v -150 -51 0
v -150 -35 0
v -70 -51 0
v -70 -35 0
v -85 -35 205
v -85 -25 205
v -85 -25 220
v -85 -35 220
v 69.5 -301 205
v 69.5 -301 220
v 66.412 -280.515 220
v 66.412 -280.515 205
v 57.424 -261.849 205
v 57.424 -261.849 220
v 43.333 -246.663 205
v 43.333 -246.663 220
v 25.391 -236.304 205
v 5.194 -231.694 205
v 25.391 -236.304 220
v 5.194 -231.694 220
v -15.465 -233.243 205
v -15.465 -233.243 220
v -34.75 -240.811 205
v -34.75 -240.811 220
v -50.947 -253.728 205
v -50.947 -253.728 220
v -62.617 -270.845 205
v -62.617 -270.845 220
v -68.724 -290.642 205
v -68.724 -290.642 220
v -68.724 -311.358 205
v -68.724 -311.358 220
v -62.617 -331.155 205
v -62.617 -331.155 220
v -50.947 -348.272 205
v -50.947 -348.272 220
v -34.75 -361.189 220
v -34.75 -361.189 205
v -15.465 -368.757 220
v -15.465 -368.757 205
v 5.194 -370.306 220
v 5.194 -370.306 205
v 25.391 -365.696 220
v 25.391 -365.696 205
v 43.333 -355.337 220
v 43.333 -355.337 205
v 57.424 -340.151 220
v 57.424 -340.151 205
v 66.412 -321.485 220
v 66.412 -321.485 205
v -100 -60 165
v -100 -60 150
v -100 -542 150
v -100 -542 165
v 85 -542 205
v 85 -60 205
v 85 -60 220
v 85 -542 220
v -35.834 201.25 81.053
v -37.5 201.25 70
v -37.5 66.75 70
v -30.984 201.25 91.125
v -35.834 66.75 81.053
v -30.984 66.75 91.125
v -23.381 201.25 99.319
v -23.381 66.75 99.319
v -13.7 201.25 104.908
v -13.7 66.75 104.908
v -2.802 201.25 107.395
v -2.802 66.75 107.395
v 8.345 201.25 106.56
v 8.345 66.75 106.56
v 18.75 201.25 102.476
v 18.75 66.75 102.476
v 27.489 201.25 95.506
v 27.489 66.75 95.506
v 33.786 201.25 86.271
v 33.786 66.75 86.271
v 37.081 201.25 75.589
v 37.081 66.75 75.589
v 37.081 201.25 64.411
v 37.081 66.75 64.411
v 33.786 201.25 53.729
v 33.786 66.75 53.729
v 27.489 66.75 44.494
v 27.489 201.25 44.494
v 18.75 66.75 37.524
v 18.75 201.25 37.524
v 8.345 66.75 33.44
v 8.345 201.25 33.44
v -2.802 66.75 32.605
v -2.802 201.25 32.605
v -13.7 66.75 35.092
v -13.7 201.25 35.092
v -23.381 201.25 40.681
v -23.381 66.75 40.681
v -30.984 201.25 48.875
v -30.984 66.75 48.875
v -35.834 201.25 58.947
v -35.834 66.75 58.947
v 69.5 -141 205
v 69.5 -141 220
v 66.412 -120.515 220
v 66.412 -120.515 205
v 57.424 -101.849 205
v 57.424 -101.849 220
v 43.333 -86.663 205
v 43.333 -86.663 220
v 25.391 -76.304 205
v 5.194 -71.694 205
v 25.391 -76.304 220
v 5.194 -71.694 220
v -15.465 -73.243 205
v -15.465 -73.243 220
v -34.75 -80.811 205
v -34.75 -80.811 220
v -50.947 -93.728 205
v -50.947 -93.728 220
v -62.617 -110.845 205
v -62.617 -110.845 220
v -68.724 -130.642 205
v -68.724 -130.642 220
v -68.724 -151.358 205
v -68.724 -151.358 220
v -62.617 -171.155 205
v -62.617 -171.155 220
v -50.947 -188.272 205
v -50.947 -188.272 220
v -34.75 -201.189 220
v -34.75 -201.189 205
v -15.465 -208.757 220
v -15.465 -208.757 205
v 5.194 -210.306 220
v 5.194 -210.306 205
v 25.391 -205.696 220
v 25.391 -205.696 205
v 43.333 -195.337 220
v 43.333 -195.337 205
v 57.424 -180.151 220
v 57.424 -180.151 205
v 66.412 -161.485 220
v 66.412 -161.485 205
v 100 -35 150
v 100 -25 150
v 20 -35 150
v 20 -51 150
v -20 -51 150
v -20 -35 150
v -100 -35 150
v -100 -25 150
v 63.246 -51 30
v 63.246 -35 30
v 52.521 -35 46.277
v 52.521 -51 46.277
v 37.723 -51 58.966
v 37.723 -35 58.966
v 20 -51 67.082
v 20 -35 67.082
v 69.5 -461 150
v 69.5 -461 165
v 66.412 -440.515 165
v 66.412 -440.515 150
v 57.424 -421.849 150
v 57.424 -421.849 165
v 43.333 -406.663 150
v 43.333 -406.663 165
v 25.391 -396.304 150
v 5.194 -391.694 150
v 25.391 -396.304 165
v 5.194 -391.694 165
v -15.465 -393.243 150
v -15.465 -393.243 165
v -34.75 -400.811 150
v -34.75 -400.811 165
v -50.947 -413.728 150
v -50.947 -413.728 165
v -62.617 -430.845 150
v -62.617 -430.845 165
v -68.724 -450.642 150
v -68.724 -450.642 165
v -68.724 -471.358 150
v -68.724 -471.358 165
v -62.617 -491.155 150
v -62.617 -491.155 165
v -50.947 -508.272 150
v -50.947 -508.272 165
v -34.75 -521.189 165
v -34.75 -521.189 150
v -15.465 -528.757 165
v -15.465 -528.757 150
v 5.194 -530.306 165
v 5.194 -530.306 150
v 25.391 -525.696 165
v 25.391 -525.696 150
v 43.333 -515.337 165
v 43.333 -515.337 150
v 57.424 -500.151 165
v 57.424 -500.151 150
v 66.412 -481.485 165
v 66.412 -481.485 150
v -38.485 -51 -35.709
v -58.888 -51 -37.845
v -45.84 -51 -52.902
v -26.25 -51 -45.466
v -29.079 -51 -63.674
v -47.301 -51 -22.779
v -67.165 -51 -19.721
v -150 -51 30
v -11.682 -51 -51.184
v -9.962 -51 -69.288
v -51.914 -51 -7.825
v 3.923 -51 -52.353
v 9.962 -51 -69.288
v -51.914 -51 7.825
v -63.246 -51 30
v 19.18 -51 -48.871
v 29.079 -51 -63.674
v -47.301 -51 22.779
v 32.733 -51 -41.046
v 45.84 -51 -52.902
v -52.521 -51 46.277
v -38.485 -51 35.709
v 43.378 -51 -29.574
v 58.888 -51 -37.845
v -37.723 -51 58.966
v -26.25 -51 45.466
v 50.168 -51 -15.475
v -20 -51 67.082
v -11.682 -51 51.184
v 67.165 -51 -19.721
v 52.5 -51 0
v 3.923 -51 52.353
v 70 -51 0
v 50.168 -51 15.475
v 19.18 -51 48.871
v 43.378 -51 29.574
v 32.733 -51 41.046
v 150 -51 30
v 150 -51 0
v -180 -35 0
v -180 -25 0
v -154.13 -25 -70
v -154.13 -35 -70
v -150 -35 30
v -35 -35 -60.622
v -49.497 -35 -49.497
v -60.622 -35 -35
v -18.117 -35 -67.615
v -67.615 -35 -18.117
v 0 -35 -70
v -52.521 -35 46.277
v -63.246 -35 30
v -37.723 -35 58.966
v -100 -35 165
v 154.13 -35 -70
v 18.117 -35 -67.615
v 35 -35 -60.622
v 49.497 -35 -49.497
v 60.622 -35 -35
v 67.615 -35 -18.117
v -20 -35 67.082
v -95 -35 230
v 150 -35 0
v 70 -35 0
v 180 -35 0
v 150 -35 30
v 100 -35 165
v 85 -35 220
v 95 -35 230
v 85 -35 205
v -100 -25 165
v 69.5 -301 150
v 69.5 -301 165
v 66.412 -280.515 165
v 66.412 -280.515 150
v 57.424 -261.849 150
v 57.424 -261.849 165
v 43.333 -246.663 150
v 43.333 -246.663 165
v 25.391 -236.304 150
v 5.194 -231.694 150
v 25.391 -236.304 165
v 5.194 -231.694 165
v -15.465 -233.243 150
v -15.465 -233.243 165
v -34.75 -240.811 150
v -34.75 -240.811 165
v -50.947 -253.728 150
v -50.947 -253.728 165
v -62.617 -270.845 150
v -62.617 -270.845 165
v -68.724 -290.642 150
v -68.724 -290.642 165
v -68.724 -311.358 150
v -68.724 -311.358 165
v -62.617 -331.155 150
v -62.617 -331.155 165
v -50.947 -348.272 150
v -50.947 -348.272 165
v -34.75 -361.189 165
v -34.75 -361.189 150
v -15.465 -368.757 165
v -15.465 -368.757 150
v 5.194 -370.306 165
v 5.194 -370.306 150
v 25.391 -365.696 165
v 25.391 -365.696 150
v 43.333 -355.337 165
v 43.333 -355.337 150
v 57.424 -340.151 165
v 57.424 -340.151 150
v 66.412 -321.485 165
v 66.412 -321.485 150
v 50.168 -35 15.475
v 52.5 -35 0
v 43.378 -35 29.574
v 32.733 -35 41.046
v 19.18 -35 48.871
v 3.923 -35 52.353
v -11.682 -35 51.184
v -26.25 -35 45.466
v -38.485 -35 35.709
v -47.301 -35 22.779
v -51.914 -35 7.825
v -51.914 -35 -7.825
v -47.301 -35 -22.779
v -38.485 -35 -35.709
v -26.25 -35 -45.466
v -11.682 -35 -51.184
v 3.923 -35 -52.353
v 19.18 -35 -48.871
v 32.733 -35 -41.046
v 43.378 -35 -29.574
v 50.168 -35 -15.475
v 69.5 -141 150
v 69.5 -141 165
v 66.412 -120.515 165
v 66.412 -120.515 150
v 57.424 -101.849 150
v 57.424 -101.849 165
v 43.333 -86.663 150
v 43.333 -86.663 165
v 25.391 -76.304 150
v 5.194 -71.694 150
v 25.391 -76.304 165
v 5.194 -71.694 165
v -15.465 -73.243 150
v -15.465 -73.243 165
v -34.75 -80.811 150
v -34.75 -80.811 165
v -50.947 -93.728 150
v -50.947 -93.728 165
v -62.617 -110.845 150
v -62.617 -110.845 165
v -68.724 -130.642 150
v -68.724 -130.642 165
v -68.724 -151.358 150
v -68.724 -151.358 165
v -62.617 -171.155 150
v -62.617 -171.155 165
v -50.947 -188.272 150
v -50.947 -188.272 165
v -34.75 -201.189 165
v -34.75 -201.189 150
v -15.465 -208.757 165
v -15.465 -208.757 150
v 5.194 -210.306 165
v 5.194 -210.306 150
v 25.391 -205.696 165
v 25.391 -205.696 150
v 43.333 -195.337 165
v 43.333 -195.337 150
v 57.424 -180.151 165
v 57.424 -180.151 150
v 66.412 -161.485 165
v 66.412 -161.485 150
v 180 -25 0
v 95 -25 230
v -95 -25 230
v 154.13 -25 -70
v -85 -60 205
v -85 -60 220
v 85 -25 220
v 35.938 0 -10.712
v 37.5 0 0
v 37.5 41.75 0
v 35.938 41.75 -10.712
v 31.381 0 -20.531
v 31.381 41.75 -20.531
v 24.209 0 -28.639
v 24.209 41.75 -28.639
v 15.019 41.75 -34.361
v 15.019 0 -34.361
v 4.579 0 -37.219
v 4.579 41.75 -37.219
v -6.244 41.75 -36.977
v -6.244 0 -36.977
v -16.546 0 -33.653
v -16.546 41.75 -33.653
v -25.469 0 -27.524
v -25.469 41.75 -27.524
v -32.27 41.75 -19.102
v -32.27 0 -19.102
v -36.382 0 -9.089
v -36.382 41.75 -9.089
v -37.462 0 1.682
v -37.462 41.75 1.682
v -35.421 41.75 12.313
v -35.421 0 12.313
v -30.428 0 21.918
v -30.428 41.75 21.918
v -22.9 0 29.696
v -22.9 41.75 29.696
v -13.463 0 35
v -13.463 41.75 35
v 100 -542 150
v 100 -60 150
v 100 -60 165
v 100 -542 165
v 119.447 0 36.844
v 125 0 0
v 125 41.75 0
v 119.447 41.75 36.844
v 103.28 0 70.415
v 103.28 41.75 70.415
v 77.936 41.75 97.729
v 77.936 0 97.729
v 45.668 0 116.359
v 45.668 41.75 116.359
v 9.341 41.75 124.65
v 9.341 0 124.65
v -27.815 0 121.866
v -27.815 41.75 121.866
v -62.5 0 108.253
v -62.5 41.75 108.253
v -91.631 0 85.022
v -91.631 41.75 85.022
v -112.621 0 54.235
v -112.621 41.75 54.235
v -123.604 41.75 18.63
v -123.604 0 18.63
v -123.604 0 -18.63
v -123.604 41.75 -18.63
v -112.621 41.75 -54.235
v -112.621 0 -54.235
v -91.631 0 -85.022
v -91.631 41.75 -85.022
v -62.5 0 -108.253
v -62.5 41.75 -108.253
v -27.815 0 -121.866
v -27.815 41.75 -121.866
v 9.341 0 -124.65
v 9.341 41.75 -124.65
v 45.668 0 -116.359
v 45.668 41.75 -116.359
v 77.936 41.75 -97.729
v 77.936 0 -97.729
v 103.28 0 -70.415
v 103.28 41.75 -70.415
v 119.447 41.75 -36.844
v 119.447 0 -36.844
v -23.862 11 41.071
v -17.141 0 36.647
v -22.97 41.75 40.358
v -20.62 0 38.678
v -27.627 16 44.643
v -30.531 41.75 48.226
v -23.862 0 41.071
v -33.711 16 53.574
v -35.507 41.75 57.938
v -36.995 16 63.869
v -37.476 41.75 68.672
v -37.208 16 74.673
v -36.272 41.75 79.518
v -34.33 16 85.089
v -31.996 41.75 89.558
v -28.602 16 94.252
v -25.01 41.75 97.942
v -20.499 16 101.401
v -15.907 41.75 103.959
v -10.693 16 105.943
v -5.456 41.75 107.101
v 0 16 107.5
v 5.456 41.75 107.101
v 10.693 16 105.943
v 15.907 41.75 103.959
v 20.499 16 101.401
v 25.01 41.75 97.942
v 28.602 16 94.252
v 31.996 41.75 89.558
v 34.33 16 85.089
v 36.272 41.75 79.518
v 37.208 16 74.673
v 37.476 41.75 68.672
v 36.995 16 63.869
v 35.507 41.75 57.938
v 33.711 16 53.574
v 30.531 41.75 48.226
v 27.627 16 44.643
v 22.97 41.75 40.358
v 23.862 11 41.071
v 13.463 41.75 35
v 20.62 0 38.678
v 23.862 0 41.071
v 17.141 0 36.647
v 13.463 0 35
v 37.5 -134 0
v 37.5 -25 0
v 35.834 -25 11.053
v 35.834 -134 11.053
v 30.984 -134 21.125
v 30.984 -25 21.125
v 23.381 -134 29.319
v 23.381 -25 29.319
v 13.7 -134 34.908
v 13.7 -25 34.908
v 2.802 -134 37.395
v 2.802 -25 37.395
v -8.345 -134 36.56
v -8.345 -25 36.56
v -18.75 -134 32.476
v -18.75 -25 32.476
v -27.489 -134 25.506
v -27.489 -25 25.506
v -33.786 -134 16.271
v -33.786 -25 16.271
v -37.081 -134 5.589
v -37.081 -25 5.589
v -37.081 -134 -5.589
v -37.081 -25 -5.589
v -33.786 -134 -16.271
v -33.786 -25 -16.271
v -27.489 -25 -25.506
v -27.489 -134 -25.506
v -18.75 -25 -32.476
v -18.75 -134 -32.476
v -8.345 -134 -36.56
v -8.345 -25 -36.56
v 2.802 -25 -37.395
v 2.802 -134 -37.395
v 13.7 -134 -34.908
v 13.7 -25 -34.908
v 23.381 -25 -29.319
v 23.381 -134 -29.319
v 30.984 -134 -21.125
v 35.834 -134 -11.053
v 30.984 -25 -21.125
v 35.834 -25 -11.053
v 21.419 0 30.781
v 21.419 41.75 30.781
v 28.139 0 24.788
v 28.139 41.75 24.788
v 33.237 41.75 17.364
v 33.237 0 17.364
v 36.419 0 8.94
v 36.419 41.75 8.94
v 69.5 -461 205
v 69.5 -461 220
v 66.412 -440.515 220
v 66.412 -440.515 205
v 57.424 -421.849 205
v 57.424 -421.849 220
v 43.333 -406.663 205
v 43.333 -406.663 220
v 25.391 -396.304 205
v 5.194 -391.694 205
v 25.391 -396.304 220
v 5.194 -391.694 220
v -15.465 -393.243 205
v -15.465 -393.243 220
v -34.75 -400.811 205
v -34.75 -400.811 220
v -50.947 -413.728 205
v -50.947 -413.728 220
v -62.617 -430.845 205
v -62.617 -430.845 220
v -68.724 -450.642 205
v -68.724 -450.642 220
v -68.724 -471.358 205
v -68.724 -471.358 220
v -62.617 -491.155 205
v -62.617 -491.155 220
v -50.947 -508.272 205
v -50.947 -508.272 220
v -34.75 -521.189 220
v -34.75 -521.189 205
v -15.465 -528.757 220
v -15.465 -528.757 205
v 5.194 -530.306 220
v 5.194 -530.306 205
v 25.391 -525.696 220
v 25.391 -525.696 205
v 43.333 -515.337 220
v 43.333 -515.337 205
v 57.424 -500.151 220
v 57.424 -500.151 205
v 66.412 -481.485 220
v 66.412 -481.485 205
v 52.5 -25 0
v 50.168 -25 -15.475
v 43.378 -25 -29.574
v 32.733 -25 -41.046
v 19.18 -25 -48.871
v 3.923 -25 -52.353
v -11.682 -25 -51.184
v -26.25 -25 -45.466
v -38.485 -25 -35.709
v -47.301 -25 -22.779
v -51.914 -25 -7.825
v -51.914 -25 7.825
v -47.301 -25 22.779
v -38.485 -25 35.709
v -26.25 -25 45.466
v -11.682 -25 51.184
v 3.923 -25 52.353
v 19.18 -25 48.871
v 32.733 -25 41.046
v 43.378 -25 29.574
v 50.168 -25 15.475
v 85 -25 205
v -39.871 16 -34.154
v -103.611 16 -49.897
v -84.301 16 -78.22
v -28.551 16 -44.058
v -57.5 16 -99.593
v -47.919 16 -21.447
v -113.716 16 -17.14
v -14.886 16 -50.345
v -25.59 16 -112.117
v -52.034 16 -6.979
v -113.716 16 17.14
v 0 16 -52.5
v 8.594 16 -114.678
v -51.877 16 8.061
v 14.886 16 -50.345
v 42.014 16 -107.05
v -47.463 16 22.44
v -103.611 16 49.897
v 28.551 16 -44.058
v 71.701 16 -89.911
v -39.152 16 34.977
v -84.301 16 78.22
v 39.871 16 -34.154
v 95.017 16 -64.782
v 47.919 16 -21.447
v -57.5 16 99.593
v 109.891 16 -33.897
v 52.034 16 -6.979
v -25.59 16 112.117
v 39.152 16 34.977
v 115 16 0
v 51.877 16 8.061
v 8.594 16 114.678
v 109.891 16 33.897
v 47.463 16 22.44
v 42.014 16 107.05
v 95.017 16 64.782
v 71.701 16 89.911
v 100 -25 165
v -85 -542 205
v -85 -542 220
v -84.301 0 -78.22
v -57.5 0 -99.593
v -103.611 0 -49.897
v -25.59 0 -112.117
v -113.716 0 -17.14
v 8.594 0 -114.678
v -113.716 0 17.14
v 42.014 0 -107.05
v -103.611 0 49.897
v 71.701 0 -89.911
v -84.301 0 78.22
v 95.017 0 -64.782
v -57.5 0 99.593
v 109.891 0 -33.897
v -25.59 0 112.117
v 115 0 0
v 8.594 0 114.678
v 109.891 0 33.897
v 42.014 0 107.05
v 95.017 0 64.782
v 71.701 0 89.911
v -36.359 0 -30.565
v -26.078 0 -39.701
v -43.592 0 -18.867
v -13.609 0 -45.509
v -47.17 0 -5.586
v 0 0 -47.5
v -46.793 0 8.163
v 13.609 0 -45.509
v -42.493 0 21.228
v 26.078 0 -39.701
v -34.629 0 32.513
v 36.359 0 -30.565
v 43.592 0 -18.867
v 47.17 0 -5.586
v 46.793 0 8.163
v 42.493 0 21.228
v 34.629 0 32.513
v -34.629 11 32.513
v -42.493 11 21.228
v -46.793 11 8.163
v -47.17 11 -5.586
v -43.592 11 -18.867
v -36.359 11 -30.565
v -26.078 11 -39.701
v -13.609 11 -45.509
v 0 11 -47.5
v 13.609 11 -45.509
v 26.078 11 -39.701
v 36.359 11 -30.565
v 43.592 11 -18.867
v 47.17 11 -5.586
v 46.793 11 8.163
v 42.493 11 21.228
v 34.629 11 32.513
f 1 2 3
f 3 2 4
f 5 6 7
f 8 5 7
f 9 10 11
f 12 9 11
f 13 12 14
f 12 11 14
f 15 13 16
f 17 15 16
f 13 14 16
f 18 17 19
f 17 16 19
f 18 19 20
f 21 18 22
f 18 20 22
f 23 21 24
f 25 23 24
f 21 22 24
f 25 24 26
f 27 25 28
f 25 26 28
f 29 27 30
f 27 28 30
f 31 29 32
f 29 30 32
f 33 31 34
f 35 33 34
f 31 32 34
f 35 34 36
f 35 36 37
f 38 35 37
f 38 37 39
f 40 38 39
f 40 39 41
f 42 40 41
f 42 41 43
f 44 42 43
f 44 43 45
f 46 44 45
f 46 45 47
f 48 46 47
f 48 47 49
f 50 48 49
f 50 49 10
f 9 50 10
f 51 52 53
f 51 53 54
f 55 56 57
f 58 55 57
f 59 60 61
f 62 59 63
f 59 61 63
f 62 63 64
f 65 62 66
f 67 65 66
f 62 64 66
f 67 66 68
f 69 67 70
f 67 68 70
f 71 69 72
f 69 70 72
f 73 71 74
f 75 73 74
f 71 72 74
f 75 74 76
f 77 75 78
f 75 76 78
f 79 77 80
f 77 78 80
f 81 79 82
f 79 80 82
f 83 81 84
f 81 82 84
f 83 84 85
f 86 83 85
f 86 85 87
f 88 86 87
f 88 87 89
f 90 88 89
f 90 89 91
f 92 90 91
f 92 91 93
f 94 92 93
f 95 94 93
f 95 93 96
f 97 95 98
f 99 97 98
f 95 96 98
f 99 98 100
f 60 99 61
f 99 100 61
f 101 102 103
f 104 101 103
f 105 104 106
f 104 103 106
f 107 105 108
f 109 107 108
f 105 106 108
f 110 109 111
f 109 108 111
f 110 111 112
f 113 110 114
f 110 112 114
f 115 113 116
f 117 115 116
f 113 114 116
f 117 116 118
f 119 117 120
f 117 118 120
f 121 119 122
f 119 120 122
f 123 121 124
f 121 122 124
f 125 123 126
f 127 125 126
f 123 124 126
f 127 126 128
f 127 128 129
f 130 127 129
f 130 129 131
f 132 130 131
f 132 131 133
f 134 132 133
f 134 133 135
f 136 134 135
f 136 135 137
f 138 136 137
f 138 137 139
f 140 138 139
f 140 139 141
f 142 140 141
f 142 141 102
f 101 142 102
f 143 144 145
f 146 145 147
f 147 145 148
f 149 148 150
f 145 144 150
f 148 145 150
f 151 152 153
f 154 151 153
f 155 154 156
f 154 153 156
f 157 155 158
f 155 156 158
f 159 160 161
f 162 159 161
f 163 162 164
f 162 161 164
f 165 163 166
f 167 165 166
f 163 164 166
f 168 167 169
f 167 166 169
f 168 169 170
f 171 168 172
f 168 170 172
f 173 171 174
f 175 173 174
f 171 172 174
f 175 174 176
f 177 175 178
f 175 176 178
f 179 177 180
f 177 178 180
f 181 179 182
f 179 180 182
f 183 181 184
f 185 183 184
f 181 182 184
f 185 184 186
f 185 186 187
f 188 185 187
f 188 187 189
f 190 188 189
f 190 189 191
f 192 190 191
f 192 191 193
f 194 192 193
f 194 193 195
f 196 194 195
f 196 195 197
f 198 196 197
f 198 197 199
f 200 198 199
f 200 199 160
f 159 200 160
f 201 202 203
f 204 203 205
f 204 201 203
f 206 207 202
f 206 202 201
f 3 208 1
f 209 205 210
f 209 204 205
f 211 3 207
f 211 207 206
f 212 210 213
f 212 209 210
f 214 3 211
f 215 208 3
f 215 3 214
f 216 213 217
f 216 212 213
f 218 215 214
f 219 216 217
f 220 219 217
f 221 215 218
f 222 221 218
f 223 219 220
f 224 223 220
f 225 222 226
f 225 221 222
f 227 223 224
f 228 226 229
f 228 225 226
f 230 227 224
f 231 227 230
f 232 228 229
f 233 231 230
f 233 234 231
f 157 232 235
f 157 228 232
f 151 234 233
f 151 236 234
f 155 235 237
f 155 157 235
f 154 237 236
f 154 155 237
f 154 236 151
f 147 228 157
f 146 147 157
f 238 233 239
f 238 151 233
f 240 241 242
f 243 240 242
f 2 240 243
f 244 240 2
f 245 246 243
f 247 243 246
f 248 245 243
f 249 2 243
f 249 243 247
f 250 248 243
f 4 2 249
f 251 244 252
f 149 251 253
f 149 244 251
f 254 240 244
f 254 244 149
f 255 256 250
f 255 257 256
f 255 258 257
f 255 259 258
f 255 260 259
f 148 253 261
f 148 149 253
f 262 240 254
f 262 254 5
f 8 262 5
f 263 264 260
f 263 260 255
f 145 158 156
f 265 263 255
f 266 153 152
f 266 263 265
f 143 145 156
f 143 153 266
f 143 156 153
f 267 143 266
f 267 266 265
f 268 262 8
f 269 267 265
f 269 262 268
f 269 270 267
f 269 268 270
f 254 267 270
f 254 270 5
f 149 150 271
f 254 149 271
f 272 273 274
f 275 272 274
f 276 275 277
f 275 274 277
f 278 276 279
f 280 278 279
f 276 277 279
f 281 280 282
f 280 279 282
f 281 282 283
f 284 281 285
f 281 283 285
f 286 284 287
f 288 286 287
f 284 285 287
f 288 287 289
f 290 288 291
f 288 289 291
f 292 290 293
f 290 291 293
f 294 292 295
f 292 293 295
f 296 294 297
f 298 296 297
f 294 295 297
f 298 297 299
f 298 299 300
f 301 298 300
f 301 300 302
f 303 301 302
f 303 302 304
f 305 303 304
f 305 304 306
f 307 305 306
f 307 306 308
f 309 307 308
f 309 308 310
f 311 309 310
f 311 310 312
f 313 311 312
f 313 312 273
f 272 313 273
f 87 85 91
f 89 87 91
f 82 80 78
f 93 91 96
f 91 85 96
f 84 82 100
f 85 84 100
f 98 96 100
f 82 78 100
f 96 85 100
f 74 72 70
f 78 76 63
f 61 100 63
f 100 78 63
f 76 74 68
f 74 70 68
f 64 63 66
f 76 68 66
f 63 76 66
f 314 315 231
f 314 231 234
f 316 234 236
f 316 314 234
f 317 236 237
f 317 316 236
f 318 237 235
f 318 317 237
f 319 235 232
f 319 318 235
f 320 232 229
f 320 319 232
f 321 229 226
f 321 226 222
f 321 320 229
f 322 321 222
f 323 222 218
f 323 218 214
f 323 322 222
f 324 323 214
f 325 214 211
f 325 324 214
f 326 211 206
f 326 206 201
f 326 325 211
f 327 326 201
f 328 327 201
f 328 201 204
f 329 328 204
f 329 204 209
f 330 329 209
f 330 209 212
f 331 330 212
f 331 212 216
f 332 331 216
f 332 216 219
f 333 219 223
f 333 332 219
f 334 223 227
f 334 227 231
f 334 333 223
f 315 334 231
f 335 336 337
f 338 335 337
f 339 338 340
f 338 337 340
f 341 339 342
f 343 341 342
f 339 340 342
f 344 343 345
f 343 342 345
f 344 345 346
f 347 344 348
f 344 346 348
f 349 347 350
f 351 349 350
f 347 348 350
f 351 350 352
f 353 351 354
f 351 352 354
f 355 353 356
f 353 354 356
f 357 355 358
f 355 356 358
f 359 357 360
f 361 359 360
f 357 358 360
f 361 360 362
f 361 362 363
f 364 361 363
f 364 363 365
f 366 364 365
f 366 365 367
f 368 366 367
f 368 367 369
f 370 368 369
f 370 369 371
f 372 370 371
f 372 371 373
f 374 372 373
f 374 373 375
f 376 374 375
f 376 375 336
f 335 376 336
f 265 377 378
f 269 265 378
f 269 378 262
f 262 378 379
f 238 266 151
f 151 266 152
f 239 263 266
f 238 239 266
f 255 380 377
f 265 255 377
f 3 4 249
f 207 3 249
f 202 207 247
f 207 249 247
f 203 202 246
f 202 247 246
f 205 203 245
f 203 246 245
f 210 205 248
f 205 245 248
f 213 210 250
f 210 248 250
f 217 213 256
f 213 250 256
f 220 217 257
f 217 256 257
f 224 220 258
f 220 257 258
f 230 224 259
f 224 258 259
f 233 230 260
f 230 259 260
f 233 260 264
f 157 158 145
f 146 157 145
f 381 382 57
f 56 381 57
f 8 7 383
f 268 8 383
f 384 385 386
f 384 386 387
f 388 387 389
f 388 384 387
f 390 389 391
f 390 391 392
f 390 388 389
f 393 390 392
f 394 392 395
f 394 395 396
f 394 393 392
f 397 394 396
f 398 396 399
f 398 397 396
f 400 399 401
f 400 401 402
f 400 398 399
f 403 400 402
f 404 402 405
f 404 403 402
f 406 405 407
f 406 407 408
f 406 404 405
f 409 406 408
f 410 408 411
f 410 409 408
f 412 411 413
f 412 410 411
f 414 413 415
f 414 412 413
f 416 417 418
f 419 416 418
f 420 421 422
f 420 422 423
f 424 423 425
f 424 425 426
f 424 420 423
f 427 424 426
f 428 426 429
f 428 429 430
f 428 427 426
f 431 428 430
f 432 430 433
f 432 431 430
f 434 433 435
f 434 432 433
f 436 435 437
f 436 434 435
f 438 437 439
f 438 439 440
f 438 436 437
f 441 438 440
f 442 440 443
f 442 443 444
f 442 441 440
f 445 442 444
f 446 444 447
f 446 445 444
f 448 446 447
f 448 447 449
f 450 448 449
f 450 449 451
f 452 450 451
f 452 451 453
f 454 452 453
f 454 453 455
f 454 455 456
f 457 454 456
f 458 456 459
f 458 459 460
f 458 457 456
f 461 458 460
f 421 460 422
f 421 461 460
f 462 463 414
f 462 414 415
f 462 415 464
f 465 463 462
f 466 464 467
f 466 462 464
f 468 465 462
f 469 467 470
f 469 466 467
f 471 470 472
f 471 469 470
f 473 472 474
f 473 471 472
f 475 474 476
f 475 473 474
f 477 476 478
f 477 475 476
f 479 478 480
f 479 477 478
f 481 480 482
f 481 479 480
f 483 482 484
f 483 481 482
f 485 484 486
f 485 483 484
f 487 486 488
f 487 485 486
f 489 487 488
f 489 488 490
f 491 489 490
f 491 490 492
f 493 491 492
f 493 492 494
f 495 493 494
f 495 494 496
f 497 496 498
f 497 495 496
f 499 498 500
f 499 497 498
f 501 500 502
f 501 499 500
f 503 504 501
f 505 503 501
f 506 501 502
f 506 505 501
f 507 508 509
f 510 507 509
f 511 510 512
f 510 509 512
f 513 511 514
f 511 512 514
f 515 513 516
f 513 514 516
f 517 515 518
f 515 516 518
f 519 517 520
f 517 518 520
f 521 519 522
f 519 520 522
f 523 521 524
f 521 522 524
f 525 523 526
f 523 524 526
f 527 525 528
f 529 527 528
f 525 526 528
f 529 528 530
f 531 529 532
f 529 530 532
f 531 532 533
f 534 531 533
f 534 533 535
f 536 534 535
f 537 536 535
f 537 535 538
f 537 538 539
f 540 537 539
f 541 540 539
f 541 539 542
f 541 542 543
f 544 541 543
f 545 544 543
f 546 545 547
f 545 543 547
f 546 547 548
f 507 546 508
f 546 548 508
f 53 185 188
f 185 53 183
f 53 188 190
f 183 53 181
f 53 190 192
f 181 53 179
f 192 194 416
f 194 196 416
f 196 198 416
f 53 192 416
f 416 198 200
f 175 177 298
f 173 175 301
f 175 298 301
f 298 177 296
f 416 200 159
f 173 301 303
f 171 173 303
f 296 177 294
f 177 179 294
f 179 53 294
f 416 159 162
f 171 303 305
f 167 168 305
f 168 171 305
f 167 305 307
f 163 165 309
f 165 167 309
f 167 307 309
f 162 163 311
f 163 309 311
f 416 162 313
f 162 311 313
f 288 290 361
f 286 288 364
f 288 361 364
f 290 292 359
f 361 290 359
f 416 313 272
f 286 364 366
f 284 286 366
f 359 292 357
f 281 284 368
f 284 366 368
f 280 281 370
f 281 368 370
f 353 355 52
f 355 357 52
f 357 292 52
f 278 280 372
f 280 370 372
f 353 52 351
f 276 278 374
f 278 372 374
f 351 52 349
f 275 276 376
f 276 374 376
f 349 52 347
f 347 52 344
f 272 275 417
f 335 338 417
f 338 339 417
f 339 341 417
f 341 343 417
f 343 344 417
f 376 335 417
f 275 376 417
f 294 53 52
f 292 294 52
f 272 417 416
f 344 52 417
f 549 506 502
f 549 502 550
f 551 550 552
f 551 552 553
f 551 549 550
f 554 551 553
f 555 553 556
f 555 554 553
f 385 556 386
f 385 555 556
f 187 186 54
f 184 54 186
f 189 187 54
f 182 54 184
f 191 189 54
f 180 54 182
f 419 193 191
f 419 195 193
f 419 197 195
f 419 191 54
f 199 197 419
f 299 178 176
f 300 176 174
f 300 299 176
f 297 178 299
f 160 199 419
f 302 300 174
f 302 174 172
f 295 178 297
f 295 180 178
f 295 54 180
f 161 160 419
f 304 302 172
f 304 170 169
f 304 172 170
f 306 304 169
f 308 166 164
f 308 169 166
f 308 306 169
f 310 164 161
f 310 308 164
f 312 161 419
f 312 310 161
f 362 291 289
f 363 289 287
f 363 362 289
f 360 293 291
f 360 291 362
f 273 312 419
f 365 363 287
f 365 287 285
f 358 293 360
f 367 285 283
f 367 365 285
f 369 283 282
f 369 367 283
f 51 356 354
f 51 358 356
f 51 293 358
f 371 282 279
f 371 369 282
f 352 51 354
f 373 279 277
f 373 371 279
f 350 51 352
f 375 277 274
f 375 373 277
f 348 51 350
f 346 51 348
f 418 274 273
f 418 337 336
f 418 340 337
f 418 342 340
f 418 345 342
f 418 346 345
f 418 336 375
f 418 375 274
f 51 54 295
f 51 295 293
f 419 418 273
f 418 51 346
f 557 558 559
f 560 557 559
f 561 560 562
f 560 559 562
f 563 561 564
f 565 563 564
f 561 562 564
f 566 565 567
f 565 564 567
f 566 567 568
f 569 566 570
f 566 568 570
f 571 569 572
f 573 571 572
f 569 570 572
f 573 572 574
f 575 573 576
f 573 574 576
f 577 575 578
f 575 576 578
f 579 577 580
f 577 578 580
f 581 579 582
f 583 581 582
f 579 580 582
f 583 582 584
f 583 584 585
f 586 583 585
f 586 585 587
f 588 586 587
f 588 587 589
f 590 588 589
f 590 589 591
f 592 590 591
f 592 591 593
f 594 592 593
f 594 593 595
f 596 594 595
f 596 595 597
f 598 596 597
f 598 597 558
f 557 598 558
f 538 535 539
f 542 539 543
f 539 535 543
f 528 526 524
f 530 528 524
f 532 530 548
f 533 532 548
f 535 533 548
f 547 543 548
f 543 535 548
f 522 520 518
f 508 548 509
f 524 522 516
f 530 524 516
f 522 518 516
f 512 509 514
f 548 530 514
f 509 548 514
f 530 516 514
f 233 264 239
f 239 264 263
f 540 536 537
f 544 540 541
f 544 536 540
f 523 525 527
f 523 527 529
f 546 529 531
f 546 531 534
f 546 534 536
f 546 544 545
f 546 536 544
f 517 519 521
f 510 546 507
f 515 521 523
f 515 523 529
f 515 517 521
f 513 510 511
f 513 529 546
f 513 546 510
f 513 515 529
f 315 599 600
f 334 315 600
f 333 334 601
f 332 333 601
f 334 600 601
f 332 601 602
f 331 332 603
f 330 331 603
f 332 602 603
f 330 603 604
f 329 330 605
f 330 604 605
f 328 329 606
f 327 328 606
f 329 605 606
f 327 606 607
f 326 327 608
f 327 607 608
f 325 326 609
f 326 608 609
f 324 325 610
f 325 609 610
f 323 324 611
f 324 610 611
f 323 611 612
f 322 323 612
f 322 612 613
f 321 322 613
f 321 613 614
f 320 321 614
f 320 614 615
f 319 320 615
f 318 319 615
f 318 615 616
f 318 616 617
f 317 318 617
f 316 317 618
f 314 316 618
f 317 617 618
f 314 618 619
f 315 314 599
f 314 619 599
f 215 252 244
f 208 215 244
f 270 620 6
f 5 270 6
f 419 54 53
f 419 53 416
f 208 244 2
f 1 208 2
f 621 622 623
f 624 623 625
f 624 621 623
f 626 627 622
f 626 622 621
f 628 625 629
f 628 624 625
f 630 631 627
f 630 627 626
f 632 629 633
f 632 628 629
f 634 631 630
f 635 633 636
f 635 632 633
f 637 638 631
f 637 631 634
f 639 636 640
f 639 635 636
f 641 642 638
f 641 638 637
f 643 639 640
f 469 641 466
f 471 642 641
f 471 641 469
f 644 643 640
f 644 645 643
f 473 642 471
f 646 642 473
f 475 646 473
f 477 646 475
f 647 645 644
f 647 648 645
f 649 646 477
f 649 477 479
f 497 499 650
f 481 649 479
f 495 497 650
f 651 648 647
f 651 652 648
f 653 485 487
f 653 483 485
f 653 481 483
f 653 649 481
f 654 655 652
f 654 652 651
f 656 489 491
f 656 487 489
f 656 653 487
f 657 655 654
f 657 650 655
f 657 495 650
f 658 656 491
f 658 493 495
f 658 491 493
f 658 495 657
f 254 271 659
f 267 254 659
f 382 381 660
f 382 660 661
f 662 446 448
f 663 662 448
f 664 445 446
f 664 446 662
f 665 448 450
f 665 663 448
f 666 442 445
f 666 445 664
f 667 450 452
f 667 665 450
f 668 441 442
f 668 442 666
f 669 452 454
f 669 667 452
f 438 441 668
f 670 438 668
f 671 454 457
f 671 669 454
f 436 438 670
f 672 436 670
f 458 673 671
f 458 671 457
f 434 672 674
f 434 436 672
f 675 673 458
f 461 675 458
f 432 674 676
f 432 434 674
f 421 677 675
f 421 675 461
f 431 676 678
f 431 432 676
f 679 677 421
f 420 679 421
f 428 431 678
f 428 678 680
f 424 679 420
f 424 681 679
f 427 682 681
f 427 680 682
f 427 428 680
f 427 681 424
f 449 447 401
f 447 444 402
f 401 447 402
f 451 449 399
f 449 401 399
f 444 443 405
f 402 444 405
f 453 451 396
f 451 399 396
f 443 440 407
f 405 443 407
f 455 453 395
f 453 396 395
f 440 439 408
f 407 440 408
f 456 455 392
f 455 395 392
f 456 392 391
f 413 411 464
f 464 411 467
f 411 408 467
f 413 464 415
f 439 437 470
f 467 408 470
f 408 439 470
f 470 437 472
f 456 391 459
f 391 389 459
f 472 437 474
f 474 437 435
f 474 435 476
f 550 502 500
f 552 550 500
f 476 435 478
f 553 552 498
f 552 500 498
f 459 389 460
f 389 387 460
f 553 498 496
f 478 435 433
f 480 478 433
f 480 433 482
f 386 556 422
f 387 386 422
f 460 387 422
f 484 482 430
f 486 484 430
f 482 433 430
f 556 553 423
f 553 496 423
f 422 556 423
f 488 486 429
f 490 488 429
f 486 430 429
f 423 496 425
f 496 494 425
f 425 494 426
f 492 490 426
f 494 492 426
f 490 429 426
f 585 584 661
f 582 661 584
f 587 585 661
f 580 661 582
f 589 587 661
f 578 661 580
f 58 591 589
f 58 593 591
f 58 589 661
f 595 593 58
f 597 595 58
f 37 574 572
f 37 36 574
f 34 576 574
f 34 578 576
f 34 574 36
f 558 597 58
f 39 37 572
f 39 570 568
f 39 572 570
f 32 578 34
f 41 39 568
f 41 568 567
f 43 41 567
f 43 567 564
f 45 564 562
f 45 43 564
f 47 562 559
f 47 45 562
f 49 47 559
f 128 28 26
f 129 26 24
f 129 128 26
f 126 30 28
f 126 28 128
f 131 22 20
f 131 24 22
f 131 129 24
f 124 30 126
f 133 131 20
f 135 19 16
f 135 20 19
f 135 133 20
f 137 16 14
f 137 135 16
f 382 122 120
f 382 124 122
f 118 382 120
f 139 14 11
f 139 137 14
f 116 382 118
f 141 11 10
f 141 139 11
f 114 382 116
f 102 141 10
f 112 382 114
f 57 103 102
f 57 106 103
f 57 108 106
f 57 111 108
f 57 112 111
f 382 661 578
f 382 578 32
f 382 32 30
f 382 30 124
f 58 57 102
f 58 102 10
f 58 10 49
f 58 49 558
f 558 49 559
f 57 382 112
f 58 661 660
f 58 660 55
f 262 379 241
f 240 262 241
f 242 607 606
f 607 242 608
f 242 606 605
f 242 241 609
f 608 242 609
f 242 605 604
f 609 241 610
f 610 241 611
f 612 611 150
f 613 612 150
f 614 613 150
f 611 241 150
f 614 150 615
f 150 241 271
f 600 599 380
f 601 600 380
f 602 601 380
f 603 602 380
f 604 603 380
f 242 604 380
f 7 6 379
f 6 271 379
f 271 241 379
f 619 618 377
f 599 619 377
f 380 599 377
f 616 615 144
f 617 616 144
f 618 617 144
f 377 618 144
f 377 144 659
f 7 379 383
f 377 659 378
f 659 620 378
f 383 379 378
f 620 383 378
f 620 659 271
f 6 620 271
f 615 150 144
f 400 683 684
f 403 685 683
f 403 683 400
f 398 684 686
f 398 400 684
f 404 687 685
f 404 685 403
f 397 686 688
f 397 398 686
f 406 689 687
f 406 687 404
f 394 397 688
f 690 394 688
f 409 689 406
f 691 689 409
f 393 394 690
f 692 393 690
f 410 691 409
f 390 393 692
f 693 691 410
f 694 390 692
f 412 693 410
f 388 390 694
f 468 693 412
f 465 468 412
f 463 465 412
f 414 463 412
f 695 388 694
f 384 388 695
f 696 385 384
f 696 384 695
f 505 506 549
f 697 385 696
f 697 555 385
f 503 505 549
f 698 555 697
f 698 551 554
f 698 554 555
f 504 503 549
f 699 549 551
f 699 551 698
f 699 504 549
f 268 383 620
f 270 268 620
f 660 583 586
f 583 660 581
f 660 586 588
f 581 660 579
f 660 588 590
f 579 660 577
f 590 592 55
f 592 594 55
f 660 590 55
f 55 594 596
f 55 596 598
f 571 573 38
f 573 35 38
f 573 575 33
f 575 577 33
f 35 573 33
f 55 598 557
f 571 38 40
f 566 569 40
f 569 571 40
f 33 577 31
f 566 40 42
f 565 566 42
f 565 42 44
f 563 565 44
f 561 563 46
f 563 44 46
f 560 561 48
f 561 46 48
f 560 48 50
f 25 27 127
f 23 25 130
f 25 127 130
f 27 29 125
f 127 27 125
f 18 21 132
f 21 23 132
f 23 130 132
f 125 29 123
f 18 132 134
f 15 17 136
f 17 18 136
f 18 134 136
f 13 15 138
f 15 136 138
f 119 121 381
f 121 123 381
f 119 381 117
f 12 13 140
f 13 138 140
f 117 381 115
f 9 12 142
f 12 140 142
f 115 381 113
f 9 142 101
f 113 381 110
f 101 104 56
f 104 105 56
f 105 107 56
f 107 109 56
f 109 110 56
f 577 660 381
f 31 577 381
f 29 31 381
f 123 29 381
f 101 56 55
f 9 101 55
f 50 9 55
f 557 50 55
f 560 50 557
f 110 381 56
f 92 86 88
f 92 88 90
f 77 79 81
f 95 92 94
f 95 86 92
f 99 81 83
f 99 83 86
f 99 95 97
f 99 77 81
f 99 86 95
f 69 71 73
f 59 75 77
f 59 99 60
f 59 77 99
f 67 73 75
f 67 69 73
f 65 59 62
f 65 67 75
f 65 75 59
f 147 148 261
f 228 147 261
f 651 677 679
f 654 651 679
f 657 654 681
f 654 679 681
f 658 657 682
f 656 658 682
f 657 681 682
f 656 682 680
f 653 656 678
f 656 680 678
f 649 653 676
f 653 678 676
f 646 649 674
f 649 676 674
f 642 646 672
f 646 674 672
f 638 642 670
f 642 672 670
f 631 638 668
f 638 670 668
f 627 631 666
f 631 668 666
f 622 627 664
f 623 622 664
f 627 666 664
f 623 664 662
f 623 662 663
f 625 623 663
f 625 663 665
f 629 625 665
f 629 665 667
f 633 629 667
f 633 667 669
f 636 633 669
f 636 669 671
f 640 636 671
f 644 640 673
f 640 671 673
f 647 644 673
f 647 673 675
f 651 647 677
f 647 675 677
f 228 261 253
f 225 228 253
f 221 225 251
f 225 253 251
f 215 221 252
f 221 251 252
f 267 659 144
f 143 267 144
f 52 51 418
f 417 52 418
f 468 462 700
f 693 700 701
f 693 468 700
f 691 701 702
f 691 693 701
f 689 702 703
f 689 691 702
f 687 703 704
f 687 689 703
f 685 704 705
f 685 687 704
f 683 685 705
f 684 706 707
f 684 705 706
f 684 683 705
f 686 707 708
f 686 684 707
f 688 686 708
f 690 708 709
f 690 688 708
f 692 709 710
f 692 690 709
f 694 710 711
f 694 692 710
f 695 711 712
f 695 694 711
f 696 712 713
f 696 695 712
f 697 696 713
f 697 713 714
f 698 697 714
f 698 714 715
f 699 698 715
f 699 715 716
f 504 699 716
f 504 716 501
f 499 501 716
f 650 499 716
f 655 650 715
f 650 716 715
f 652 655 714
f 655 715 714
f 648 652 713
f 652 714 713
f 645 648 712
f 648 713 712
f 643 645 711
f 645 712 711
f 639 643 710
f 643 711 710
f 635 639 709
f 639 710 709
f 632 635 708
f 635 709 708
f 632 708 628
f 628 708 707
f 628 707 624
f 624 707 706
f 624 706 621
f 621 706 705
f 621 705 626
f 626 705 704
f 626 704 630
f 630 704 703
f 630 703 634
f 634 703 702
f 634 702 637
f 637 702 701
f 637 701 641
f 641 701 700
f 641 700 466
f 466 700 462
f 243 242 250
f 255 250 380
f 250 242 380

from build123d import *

# Parameters (mm, degrees)
F0_R      = 125
F1_DEPTH  = 41.75
F3_R      = 37.5
F4_DEPTH  = 109
F6_R      = 37.5
F7_DEPTH  = 134.5
F9_DEPTH  = 10
F10_R     = 52.5
F11_DEPTH = 16
F13_W     = 170
F13_H     = 15
F14_DEPTH = 482
F13_W_2   = 200
F15_R     = 69.5
F16_DEPTH = 100
F17_R     = 115
F17_R_2   = 47.5
F18_DEPTH = 16
F19_SIZE  = 5


with BuildPart() as f1:
    # F0 (on Front) → F1 (new body)
    with BuildSketch(Plane.XZ):
        Circle(F0_R)
        with BuildLine():
            ThreePointArc((36.1296990006, 59.9553571429), (60.9470217896, 34.4305174951), (70, 0))
            ThreePointArc((70, 0), (-34.4305174951, -60.9470217896), (-36.1296990006, 59.9553571429))
            ThreePointArc((-36.1296990006, 59.9553571429), (-5.0688404728, 107.1558455194), (37.5, 70))
            ThreePointArc((37.5, 70), (37.1558455194, 64.9311595272), (36.1296990006, 59.9553571429))
        make_face(mode=Mode.SUBTRACT)
        with BuildLine():
            ThreePointArc((-36.1296990006, 59.9553571429), (-34.4305174951, -60.9470217896), (70, 0))
            ThreePointArc((70, 0), (60.9470217896, 34.4305174951), (36.1296990006, 59.9553571429))
            ThreePointArc((36.1296990006, 59.9553571429), (27.7587685144, 44.7868928816), (13.4629120178, 35))
            ThreePointArc((13.4629120178, 35), (30.912046201, 21.2295878355), (37.5, 0))
            ThreePointArc((37.5, 0), (-21.2295878355, -30.912046201), (-13.4629120178, 35))
            ThreePointArc((-13.4629120178, 35), (-27.7587685144, 44.7868928816), (-36.1296990006, 59.9553571429))
        make_face()
    extrude(amount=-F1_DEPTH)

    # F17 (on face) → F18 (cut)
    with BuildSketch(Plane.XZ):
        Circle(F17_R)
        with BuildLine():
            ThreePointArc((37.5, 70), (37.1558455194, 64.9311595272), (36.1296990006, 59.9553571429))
            ThreePointArc((36.1296990006, 59.9553571429), (60.9470217896, 34.4305174951), (70, 0))
            ThreePointArc((70, 0), (-34.4305174951, -60.9470217896), (-36.1296990006, 59.9553571429))
            ThreePointArc((-36.1296990006, 59.9553571429), (-5.0688404728, 107.1558455194), (37.5, 70))
        make_face(mode=Mode.SUBTRACT)
        with BuildLine():
            ThreePointArc((70, 0), (60.9470217896, 34.4305174951), (36.1296990006, 59.9553571429))
            ThreePointArc((36.1296990006, 59.9553571429), (37.1558455194, 64.9311595272), (37.5, 70))
            ThreePointArc((37.5, 70), (-5.0688404728, 107.1558455194), (-36.1296990006, 59.9553571429))
            ThreePointArc((-36.1296990006, 59.9553571429), (-34.4305174951, -60.9470217896), (70, 0))
        make_face()
        Circle(F17_R_2, mode=Mode.SUBTRACT)
    extrude(amount=-F18_DEPTH, mode=Mode.SUBTRACT)

    # F19
    f19_edges = [f1.edges().sort_by_distance(p)[0] for p in [
        (0, 16, -47.5),
    ]]
    chamfer(f19_edges, length=F19_SIZE)


with BuildPart() as f4:
    # F3 (on offset) → F4 (new body)
    with BuildSketch(Plane.XZ.offset(25)):
        Circle(F3_R)
    extrude(amount=F4_DEPTH)


with BuildPart() as f7:
    # F6 (on offset) → F7 (new body)
    with BuildSketch(Plane(origin=(0, 66.75, 0), x_dir=(-1, 0, 0), z_dir=(0, 1, 0))):
        with Locations((0, 70)):
            Circle(F6_R)
    extrude(amount=F7_DEPTH)


with BuildPart() as f9:
    # F8 (on offset) → F9 (new body)
    with BuildSketch(Plane.XZ.offset(25)):
        with BuildLine():
            ThreePointArc((0, -52.5), (-37.1231060123, 37.1231060123), (52.5, 0))
            Line((52.5, 0), (180, 0))
            Line((180, 0), (95, 230))
            Line((95, 230), (0, 230))
            Line((0, 230), (-95, 230))
            Line((-95, 230), (-180, 0))
            Line((-180, 0), (-154.1304347826, -70))
            Line((-154.1304347826, -70), (0, -70))
            Line((0, -70), (0, -52.5))
        make_face()
        Polygon((-100, 165), (0, 165), (100, 165), (100, 150), (0, 150), (-100, 150), align=None, mode=Mode.SUBTRACT)
        Polygon((-85, 220), (0, 220), (85, 220), (85, 205), (0, 205), (-85, 205), align=None, mode=Mode.SUBTRACT)
        with BuildLine():
            Line((180, 0), (52.5, 0))
            ThreePointArc((52.5, 0), (37.1231060123, -37.1231060123), (0, -52.5))
            Line((0, -52.5), (0, -70))
            Line((0, -70), (154.1304347826, -70))
            Line((154.1304347826, -70), (180, 0))
        make_face()
    extrude(amount=F9_DEPTH)

    # F10 (on face) → F11 (join)
    with BuildSketch(Plane.XZ.offset(35)):
        with BuildLine():
            ThreePointArc((-20, 67.082039325), (-10.1058707505, 69.2666685815), (0, 70))
            Line((0, 70), (0, 150))
            Line((0, 150), (-20, 150))
            Line((-20, 150), (-20, 67.082039325))
        make_face()
        with BuildLine():
            ThreePointArc((0, 70), (10.1058707505, 69.2666685815), (20, 67.082039325))
            Line((20, 67.082039325), (20, 150))
            Line((20, 150), (0, 150))
            Line((0, 150), (0, 70))
        make_face()
        with BuildLine():
            ThreePointArc((1.627e-07, -70), (49.4974747406, -49.4974746255), (70, 0))
            ThreePointArc((70, 0), (68.2905144373, 15.3754882161), (63.2455532034, 30))
            ThreePointArc((63.2455532034, 30), (45.5656113989, 53.1392045277), (20, 67.082039325))
            ThreePointArc((20, 67.082039325), (10.1058707505, 69.2666685815), (0, 70))
            ThreePointArc((0, 70), (-10.1058707505, 69.2666685815), (-20, 67.082039325))
            ThreePointArc((-20, 67.082039325), (-45.5656113989, 53.1392045277), (-63.2455532034, 30))
            ThreePointArc((-63.2455532034, 30), (-68.2905144373, 15.3754882161), (-70, 0))
            ThreePointArc((-70, 0), (-49.4974746255, -49.4974747406), (1.627e-07, -70))
        make_face()
        Circle(F10_R, mode=Mode.SUBTRACT)
        with BuildLine():
            ThreePointArc((63.2455532034, 30), (68.2905144373, 15.3754882161), (70, 0))
            Line((70, 0), (150, 0))
            Line((150, 0), (150, 30))
            Line((150, 30), (63.2455532034, 30))
        make_face()
        with BuildLine():
            Line((-150, 0), (-70, 0))
            ThreePointArc((-70, 0), (-68.2905144373, 15.3754882161), (-63.2455532034, 30))
            Line((-63.2455532034, 30), (-150, 30))
            Line((-150, 30), (-150, 0))
        make_face()
    extrude(amount=F11_DEPTH)


with BuildPart() as f14:
    # F13 (on offset) → F14 (new body)
    with BuildSketch(Plane.XZ.offset(60)):
        with Locations((0, 212.5)):
            Rectangle(F13_W, F13_H)
    extrude(amount=F14_DEPTH)


with BuildPart() as f14b:
    # F13 (on offset) → F14, piece 2 (new body)
    with BuildSketch(Plane.XZ.offset(60)):
        with Locations((0, 157.5)):
            Rectangle(F13_W_2, F13_H)
    extrude(amount=F14_DEPTH)


with BuildPart() as f16_tool:
    # F15 (on face) → F16 (new body)
    with BuildSketch(Plane.XY.offset(220)):
        with Locations((0, -461)):
            Circle(F15_R)
        with Locations((0, -301)):
            Circle(F15_R)
        with Locations((0, -141)):
            Circle(F15_R)
    extrude(amount=-F16_DEPTH)


with BuildPart() as f14_1:
    add(f14.part)

    # F16: cut by f16_tool
    add(f16_tool.part, mode=Mode.SUBTRACT)


with BuildPart() as f14b_1:
    add(f14b.part)

    # F16: cut by f16_tool
    add(f16_tool.part, mode=Mode.SUBTRACT)


solid = Compound([f1.part, f4.part, f7.part, f9.part, f14_1.part, f14b_1.part])
